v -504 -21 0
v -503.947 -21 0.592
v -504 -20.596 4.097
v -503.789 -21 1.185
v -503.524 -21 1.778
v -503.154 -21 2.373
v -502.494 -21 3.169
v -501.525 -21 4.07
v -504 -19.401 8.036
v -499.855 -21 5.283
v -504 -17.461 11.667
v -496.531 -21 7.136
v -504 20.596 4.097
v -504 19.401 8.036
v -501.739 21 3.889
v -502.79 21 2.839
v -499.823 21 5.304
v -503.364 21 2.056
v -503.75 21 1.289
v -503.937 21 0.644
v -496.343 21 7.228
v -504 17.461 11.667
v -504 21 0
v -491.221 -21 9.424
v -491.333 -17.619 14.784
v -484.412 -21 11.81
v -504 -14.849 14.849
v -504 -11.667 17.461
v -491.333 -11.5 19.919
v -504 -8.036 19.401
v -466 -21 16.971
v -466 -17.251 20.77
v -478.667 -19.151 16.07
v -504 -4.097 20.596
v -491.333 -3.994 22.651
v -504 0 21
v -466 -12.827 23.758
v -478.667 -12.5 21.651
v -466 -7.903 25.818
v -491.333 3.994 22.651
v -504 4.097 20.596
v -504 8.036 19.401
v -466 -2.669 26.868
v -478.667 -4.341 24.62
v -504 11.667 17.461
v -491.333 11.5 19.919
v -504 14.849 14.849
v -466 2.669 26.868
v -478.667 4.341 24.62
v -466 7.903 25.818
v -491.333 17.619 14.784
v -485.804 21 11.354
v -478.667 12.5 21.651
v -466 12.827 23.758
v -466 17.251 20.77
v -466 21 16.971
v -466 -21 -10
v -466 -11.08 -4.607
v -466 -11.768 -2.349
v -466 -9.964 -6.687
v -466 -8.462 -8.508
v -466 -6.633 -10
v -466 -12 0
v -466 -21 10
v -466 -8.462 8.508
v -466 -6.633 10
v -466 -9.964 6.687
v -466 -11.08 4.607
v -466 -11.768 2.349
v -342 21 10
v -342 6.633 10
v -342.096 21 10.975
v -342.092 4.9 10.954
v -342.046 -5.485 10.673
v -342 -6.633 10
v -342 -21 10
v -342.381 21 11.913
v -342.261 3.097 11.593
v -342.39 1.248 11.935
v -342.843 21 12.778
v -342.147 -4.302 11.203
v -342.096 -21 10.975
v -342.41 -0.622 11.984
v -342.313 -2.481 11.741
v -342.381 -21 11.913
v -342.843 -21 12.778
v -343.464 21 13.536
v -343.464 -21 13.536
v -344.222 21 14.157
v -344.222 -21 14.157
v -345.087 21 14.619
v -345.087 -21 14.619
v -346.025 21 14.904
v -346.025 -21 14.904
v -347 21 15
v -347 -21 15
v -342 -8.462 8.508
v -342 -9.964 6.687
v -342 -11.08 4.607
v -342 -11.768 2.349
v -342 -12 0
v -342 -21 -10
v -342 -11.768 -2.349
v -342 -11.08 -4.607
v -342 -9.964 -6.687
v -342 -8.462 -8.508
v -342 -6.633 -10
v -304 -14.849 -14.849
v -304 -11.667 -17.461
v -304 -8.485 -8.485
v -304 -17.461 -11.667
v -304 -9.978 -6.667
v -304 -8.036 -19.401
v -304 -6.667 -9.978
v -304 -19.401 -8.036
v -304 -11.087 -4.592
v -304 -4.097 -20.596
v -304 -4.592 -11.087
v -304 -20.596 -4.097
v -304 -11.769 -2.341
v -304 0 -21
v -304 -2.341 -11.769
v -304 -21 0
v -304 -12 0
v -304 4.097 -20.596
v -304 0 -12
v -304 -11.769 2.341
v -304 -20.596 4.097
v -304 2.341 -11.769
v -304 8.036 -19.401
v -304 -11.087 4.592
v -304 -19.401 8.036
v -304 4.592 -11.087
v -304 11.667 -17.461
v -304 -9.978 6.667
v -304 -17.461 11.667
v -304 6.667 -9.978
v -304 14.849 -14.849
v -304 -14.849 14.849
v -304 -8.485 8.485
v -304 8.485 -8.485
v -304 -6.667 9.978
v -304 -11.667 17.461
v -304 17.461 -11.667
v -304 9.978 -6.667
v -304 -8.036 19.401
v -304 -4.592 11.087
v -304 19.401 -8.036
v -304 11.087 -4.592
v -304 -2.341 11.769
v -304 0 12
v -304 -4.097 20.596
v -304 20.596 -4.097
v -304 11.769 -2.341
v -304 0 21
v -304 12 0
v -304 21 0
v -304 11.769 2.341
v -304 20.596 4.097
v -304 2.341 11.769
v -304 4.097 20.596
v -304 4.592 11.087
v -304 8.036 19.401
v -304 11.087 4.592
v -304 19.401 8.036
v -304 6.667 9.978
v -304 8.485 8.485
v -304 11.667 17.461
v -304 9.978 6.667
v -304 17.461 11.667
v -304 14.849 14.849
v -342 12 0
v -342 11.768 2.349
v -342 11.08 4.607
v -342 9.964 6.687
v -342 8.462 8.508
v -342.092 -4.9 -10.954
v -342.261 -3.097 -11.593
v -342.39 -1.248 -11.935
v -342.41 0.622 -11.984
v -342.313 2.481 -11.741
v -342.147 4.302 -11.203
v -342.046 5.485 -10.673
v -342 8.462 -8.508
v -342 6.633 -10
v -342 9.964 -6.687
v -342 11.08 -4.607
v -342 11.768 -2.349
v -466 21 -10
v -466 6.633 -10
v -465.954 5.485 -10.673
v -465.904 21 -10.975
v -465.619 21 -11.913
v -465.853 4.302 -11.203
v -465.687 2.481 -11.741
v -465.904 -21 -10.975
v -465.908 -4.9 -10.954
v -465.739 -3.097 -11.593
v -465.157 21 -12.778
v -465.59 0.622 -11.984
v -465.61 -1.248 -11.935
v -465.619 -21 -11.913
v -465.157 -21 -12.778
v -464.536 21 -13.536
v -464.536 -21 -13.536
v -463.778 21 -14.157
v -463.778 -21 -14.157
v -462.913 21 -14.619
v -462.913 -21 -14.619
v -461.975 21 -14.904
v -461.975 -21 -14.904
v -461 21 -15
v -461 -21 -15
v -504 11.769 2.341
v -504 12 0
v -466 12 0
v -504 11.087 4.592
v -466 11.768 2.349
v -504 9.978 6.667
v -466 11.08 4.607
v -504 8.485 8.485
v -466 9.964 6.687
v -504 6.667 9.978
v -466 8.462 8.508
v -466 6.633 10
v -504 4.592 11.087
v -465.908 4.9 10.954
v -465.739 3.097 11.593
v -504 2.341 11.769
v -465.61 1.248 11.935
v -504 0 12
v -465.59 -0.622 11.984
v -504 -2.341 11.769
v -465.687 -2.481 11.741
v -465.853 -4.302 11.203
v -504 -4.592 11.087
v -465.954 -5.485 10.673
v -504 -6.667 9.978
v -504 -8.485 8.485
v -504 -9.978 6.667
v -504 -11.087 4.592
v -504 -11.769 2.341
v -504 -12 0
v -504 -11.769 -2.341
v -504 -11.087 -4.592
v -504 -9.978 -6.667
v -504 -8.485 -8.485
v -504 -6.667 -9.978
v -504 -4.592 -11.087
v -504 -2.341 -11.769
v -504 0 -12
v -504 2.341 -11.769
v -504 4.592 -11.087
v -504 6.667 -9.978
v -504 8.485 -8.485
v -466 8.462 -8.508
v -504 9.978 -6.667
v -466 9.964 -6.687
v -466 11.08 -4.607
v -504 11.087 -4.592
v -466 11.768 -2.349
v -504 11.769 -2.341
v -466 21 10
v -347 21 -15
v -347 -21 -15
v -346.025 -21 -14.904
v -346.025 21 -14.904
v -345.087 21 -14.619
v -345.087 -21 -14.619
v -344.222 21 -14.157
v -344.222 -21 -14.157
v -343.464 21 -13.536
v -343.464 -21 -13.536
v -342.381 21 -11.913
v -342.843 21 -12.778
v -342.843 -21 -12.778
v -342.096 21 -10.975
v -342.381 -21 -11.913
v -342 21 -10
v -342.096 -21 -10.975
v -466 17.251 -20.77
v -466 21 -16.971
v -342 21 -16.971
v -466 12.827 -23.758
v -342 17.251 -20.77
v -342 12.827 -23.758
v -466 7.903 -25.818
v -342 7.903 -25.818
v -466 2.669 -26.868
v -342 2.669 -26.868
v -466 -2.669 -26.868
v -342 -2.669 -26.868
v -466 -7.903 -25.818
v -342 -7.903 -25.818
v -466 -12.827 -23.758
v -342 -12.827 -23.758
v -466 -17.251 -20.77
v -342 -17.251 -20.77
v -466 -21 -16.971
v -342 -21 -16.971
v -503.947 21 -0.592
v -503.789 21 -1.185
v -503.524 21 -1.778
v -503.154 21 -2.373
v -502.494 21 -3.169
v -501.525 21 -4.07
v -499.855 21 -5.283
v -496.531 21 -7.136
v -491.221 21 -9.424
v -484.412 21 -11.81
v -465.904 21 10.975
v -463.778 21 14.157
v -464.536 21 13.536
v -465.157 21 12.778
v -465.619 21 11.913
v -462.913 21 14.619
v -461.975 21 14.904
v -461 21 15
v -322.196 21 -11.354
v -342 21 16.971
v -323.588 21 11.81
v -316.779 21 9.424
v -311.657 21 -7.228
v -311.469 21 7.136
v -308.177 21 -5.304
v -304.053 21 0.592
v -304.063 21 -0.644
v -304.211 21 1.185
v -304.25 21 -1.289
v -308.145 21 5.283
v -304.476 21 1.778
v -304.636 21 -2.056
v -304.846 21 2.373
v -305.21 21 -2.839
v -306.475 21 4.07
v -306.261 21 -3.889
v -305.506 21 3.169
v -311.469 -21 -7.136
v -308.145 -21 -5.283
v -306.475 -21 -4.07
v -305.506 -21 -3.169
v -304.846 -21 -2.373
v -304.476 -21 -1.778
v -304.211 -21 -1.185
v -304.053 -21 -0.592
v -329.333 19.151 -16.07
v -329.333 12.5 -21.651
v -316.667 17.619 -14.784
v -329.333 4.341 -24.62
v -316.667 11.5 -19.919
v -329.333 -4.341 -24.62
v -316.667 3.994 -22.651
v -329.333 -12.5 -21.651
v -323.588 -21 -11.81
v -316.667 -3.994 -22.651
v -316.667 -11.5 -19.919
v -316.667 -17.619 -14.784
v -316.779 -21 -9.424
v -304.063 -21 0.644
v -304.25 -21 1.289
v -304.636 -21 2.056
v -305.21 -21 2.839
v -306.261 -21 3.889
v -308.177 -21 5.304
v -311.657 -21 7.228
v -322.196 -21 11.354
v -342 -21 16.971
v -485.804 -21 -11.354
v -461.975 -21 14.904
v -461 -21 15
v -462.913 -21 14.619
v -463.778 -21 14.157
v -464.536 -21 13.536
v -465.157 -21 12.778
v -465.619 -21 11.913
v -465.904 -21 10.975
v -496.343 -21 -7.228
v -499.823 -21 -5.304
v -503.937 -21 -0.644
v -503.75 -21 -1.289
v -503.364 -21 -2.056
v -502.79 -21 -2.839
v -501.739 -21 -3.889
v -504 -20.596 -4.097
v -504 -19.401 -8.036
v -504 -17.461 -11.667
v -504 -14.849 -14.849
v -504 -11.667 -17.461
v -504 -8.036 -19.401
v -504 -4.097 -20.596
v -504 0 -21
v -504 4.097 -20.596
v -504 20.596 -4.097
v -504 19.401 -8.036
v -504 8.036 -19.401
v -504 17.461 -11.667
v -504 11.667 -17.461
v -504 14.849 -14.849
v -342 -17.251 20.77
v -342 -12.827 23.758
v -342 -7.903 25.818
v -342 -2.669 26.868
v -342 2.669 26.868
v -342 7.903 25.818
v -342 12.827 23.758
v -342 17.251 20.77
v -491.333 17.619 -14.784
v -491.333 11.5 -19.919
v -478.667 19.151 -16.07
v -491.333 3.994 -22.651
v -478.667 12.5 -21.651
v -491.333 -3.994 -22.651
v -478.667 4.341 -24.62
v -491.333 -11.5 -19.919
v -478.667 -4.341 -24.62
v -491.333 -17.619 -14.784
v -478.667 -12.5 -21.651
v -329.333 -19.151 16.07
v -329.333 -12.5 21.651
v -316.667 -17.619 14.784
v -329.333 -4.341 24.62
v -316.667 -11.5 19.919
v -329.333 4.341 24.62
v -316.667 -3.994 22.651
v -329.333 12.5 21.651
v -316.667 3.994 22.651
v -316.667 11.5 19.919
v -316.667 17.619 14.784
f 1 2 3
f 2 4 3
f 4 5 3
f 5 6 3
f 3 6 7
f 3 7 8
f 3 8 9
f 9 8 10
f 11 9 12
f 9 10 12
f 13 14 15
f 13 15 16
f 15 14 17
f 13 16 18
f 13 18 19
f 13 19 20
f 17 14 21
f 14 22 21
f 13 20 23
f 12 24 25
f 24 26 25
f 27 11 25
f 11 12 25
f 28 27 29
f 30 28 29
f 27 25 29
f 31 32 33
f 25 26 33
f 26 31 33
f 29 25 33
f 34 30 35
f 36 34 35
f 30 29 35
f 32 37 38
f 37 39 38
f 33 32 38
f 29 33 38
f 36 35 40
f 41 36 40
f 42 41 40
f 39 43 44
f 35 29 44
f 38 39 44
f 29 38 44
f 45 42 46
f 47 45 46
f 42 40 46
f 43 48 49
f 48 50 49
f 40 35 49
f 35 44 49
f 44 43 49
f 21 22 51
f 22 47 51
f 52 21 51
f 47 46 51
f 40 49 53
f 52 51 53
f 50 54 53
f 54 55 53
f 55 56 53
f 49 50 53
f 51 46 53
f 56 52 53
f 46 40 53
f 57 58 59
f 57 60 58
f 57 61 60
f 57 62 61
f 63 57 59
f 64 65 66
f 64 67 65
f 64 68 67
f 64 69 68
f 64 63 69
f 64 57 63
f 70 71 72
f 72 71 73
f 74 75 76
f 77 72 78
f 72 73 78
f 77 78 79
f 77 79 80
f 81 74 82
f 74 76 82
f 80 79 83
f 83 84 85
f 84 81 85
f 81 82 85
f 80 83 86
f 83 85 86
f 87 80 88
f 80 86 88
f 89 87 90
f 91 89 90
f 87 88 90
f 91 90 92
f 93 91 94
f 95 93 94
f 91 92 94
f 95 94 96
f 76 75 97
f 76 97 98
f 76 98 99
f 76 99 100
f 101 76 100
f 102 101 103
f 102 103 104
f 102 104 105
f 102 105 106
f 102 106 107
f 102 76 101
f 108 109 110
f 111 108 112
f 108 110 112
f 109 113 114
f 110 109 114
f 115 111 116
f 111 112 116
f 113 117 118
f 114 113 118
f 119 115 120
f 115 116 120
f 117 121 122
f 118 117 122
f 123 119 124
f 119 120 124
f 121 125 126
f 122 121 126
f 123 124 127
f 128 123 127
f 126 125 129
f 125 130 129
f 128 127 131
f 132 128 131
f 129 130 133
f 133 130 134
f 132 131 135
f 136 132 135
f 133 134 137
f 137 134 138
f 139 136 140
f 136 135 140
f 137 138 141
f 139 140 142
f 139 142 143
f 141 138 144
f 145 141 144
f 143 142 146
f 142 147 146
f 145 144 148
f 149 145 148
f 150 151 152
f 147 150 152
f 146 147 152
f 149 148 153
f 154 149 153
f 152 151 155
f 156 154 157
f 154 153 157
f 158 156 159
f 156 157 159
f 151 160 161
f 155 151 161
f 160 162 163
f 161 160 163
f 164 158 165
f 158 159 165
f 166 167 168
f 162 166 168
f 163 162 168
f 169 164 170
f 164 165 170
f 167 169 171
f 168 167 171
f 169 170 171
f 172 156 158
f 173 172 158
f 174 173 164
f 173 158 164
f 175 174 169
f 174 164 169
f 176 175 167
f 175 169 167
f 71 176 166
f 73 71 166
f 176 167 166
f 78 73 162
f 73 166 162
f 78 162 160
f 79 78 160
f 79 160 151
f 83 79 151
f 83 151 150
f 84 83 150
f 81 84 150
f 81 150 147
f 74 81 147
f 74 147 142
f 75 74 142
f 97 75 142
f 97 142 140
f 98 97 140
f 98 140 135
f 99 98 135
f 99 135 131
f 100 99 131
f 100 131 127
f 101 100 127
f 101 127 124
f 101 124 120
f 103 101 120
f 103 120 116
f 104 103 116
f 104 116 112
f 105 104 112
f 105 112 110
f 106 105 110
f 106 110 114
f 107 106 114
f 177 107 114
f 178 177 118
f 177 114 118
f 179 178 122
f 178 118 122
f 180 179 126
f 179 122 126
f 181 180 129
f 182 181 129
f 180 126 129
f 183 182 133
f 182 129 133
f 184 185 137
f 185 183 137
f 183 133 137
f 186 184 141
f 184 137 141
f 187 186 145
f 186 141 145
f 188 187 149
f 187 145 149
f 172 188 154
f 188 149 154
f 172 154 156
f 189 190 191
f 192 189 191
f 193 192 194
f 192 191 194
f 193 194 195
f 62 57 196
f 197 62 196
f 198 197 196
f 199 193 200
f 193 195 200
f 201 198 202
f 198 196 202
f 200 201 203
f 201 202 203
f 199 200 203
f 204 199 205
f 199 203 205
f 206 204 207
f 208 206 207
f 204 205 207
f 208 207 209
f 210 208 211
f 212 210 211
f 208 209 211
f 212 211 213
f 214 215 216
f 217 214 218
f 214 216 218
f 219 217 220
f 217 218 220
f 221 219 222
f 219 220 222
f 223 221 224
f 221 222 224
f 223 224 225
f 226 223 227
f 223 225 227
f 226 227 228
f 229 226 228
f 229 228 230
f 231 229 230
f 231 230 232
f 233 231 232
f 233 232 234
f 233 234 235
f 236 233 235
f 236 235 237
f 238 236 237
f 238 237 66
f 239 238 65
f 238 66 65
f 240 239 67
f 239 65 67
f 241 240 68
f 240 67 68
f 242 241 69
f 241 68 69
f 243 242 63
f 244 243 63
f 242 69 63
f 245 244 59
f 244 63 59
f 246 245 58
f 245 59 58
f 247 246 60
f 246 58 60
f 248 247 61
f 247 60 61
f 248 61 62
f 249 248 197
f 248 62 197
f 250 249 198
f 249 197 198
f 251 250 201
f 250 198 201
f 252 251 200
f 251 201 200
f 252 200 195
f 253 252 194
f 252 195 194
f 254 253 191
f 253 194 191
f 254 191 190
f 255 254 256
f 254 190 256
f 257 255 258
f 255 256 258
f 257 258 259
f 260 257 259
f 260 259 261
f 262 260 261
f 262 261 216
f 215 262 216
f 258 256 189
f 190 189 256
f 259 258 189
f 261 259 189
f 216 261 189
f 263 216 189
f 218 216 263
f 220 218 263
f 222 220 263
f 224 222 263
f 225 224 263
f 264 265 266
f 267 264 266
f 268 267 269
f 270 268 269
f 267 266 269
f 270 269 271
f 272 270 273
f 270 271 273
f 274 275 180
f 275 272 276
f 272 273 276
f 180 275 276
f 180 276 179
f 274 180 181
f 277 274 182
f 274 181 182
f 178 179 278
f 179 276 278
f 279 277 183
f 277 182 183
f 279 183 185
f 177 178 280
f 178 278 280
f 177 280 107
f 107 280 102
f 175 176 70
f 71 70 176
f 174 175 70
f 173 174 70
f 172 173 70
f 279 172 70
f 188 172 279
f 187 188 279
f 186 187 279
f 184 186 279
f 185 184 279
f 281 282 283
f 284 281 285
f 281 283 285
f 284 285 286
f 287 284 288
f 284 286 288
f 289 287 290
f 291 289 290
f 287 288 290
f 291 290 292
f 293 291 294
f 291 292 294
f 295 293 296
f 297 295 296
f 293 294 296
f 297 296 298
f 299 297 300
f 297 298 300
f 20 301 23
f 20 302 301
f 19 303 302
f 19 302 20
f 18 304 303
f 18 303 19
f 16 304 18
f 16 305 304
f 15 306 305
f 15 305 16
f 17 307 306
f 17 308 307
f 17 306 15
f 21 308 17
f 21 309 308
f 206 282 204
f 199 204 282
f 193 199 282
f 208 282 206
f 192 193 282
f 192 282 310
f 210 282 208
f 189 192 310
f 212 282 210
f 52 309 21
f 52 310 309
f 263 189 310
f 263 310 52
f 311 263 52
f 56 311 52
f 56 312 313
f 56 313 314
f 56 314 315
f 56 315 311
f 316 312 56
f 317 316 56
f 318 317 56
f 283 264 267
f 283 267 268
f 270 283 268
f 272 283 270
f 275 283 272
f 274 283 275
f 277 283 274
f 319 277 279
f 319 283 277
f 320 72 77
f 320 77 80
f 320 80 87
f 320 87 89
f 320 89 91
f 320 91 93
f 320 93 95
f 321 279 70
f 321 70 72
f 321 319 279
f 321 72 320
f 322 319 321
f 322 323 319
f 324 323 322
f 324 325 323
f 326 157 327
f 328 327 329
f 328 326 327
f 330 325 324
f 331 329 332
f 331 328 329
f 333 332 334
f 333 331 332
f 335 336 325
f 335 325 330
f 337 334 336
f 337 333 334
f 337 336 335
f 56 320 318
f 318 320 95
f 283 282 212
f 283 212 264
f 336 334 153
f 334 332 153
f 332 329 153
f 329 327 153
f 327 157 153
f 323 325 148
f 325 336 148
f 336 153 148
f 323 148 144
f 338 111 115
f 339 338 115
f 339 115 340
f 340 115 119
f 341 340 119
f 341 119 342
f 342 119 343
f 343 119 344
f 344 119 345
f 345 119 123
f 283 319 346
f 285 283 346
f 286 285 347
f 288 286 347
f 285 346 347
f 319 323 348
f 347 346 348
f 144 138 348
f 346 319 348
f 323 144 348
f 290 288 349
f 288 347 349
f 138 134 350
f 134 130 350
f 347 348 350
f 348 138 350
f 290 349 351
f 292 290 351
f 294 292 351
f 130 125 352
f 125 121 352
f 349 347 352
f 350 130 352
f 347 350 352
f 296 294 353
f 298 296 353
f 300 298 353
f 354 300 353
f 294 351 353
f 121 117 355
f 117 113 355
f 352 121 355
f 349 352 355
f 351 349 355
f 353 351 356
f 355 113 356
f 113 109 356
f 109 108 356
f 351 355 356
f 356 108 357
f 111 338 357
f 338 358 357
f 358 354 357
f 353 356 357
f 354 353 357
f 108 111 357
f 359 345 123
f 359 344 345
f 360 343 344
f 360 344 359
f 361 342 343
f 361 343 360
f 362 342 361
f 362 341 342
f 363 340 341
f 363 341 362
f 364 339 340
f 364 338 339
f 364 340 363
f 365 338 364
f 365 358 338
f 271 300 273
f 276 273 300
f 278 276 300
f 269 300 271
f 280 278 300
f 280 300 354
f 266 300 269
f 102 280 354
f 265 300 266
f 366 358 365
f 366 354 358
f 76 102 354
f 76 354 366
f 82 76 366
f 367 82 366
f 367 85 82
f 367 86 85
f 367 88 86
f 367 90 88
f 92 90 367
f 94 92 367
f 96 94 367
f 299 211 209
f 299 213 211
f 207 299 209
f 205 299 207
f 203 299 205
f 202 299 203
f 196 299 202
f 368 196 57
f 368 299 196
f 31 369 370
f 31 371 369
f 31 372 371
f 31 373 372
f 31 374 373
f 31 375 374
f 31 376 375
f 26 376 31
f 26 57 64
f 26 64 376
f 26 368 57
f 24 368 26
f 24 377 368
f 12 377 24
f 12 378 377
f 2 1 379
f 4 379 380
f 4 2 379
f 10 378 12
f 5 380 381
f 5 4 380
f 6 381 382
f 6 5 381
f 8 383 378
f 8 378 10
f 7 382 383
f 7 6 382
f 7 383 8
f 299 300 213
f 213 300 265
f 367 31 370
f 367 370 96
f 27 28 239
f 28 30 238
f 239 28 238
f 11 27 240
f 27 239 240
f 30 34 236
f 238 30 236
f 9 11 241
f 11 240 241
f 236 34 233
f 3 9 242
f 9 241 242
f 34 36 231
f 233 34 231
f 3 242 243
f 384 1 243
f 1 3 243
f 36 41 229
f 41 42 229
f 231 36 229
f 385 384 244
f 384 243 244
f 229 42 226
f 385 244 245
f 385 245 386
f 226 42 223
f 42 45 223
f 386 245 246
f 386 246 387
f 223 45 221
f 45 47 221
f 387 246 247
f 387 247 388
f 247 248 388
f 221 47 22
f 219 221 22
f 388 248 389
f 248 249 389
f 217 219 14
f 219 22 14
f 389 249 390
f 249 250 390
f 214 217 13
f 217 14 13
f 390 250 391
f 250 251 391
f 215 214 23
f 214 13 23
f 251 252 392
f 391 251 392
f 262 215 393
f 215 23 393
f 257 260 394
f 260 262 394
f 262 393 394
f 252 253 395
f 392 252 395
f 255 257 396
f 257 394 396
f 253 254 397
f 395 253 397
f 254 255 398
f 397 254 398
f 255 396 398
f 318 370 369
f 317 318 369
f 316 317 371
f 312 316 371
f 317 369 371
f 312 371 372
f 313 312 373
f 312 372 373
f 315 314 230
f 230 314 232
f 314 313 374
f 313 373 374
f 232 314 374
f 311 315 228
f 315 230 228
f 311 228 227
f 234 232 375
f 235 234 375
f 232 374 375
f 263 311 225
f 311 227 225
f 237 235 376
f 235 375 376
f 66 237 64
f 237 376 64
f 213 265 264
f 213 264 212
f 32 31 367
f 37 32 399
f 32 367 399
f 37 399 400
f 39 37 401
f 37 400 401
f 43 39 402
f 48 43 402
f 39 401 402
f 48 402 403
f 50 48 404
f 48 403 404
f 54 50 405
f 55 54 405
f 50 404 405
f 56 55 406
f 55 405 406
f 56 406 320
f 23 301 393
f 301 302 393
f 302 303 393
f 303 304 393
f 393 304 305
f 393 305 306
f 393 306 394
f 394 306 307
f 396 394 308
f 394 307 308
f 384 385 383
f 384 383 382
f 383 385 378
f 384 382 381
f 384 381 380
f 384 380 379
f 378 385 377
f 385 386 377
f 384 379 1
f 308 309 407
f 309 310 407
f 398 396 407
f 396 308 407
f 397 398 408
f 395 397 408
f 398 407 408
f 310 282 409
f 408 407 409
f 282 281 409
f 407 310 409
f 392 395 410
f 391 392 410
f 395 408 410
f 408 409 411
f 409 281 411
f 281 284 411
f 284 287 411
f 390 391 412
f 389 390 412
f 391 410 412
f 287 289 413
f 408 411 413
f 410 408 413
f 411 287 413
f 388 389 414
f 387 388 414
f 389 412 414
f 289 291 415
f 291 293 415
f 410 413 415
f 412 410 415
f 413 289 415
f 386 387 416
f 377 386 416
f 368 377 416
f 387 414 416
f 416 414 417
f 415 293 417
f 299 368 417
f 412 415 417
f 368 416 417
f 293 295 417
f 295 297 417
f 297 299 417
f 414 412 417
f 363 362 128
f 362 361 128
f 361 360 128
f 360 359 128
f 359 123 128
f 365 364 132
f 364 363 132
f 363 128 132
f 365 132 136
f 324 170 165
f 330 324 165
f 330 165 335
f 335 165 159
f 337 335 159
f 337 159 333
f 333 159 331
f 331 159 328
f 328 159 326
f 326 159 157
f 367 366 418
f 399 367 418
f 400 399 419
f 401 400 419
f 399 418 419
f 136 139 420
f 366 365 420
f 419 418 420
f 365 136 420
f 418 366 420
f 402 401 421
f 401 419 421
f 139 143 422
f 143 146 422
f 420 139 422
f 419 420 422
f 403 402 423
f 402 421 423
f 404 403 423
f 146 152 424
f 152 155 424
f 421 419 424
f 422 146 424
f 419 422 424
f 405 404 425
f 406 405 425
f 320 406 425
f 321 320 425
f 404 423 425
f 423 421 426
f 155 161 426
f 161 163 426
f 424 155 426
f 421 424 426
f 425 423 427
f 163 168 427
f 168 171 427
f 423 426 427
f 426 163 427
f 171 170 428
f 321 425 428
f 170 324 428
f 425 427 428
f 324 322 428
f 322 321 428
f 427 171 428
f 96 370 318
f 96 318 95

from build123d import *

# Parameters (mm, degrees)
SKETCH014_R      = 12
EXTRUDE006_DEPTH = 150
EXTRUDE005_DEPTH = 30
SKETCH012_W      = 15
SKETCH012_H      = 79.05159
SKETCH012_H_2    = 80
EXTRUDE004_DEPTH = 150


with BuildPart() as extrude006:
    # Sketch014 → Extrude006 (new body, symmetric)
    with BuildSketch(Plane.YZ):
        Circle(SKETCH014_R)
    extrude(amount=EXTRUDE006_DEPTH, both=True)


with BuildPart() as extrude005:
    # Sketch013 → Extrude005 (new body, symmetric)
    with BuildSketch(Plane.XZ):
        with BuildLine():
            Line((62, 10), (62, -10))
            ThreePointArc((57, -15), (60.535534, -13.535534), (62, -10))
            Line((57, -15), (-57, -15))
            ThreePointArc((-62, -10), (-60.535534, -13.535534), (-57, -15))
            Line((-62, -10), (-62, 10))
            ThreePointArc((-57, 15), (-60.535534, 13.535534), (-62, 10))
            Line((-57, 15), (57, 15))
            ThreePointArc((62, 10), (60.535534, 13.535534), (57, 15))
        make_face()
    extrude(amount=EXTRUDE005_DEPTH, both=True)


with BuildPart() as extrude004:
    # Sketch012 → Extrude004 (new body, symmetric)
    with BuildSketch(Plane.YZ):
        with Locations((-28.5, 0.159191)):
            Rectangle(SKETCH012_W, SKETCH012_H)
        with Locations((28.5, -0.315014)):
            Rectangle(SKETCH012_W, SKETCH012_H_2)
    extrude(amount=EXTRUDE004_DEPTH, both=True)


with BuildPart() as turnbackle:
    # Sketch011 → Revolve (revolve)
    with BuildSketch(Plane.XZ):
        Polygon((-100, 0), (-100, 21), (-62, 27), (62, 27), (100, 21), (100, 0), align=None)
    revolve(axis=Axis((-100, 0, 0), (-1, 0, 0)))

    # Cut004: cut Extrude004
    add(extrude004.part, mode=Mode.SUBTRACT)

    # Cut005: cut Extrude005
    add(extrude005.part, mode=Mode.SUBTRACT)

    # Cut006: cut Extrude006
    add(extrude006.part, mode=Mode.SUBTRACT)


with BuildPart() as turnbackle_1:
    # Cut006 placement: moved
    add(turnbackle.part.moved(Location((-404, 0, 0))))


solid = turnbackle_1.part
